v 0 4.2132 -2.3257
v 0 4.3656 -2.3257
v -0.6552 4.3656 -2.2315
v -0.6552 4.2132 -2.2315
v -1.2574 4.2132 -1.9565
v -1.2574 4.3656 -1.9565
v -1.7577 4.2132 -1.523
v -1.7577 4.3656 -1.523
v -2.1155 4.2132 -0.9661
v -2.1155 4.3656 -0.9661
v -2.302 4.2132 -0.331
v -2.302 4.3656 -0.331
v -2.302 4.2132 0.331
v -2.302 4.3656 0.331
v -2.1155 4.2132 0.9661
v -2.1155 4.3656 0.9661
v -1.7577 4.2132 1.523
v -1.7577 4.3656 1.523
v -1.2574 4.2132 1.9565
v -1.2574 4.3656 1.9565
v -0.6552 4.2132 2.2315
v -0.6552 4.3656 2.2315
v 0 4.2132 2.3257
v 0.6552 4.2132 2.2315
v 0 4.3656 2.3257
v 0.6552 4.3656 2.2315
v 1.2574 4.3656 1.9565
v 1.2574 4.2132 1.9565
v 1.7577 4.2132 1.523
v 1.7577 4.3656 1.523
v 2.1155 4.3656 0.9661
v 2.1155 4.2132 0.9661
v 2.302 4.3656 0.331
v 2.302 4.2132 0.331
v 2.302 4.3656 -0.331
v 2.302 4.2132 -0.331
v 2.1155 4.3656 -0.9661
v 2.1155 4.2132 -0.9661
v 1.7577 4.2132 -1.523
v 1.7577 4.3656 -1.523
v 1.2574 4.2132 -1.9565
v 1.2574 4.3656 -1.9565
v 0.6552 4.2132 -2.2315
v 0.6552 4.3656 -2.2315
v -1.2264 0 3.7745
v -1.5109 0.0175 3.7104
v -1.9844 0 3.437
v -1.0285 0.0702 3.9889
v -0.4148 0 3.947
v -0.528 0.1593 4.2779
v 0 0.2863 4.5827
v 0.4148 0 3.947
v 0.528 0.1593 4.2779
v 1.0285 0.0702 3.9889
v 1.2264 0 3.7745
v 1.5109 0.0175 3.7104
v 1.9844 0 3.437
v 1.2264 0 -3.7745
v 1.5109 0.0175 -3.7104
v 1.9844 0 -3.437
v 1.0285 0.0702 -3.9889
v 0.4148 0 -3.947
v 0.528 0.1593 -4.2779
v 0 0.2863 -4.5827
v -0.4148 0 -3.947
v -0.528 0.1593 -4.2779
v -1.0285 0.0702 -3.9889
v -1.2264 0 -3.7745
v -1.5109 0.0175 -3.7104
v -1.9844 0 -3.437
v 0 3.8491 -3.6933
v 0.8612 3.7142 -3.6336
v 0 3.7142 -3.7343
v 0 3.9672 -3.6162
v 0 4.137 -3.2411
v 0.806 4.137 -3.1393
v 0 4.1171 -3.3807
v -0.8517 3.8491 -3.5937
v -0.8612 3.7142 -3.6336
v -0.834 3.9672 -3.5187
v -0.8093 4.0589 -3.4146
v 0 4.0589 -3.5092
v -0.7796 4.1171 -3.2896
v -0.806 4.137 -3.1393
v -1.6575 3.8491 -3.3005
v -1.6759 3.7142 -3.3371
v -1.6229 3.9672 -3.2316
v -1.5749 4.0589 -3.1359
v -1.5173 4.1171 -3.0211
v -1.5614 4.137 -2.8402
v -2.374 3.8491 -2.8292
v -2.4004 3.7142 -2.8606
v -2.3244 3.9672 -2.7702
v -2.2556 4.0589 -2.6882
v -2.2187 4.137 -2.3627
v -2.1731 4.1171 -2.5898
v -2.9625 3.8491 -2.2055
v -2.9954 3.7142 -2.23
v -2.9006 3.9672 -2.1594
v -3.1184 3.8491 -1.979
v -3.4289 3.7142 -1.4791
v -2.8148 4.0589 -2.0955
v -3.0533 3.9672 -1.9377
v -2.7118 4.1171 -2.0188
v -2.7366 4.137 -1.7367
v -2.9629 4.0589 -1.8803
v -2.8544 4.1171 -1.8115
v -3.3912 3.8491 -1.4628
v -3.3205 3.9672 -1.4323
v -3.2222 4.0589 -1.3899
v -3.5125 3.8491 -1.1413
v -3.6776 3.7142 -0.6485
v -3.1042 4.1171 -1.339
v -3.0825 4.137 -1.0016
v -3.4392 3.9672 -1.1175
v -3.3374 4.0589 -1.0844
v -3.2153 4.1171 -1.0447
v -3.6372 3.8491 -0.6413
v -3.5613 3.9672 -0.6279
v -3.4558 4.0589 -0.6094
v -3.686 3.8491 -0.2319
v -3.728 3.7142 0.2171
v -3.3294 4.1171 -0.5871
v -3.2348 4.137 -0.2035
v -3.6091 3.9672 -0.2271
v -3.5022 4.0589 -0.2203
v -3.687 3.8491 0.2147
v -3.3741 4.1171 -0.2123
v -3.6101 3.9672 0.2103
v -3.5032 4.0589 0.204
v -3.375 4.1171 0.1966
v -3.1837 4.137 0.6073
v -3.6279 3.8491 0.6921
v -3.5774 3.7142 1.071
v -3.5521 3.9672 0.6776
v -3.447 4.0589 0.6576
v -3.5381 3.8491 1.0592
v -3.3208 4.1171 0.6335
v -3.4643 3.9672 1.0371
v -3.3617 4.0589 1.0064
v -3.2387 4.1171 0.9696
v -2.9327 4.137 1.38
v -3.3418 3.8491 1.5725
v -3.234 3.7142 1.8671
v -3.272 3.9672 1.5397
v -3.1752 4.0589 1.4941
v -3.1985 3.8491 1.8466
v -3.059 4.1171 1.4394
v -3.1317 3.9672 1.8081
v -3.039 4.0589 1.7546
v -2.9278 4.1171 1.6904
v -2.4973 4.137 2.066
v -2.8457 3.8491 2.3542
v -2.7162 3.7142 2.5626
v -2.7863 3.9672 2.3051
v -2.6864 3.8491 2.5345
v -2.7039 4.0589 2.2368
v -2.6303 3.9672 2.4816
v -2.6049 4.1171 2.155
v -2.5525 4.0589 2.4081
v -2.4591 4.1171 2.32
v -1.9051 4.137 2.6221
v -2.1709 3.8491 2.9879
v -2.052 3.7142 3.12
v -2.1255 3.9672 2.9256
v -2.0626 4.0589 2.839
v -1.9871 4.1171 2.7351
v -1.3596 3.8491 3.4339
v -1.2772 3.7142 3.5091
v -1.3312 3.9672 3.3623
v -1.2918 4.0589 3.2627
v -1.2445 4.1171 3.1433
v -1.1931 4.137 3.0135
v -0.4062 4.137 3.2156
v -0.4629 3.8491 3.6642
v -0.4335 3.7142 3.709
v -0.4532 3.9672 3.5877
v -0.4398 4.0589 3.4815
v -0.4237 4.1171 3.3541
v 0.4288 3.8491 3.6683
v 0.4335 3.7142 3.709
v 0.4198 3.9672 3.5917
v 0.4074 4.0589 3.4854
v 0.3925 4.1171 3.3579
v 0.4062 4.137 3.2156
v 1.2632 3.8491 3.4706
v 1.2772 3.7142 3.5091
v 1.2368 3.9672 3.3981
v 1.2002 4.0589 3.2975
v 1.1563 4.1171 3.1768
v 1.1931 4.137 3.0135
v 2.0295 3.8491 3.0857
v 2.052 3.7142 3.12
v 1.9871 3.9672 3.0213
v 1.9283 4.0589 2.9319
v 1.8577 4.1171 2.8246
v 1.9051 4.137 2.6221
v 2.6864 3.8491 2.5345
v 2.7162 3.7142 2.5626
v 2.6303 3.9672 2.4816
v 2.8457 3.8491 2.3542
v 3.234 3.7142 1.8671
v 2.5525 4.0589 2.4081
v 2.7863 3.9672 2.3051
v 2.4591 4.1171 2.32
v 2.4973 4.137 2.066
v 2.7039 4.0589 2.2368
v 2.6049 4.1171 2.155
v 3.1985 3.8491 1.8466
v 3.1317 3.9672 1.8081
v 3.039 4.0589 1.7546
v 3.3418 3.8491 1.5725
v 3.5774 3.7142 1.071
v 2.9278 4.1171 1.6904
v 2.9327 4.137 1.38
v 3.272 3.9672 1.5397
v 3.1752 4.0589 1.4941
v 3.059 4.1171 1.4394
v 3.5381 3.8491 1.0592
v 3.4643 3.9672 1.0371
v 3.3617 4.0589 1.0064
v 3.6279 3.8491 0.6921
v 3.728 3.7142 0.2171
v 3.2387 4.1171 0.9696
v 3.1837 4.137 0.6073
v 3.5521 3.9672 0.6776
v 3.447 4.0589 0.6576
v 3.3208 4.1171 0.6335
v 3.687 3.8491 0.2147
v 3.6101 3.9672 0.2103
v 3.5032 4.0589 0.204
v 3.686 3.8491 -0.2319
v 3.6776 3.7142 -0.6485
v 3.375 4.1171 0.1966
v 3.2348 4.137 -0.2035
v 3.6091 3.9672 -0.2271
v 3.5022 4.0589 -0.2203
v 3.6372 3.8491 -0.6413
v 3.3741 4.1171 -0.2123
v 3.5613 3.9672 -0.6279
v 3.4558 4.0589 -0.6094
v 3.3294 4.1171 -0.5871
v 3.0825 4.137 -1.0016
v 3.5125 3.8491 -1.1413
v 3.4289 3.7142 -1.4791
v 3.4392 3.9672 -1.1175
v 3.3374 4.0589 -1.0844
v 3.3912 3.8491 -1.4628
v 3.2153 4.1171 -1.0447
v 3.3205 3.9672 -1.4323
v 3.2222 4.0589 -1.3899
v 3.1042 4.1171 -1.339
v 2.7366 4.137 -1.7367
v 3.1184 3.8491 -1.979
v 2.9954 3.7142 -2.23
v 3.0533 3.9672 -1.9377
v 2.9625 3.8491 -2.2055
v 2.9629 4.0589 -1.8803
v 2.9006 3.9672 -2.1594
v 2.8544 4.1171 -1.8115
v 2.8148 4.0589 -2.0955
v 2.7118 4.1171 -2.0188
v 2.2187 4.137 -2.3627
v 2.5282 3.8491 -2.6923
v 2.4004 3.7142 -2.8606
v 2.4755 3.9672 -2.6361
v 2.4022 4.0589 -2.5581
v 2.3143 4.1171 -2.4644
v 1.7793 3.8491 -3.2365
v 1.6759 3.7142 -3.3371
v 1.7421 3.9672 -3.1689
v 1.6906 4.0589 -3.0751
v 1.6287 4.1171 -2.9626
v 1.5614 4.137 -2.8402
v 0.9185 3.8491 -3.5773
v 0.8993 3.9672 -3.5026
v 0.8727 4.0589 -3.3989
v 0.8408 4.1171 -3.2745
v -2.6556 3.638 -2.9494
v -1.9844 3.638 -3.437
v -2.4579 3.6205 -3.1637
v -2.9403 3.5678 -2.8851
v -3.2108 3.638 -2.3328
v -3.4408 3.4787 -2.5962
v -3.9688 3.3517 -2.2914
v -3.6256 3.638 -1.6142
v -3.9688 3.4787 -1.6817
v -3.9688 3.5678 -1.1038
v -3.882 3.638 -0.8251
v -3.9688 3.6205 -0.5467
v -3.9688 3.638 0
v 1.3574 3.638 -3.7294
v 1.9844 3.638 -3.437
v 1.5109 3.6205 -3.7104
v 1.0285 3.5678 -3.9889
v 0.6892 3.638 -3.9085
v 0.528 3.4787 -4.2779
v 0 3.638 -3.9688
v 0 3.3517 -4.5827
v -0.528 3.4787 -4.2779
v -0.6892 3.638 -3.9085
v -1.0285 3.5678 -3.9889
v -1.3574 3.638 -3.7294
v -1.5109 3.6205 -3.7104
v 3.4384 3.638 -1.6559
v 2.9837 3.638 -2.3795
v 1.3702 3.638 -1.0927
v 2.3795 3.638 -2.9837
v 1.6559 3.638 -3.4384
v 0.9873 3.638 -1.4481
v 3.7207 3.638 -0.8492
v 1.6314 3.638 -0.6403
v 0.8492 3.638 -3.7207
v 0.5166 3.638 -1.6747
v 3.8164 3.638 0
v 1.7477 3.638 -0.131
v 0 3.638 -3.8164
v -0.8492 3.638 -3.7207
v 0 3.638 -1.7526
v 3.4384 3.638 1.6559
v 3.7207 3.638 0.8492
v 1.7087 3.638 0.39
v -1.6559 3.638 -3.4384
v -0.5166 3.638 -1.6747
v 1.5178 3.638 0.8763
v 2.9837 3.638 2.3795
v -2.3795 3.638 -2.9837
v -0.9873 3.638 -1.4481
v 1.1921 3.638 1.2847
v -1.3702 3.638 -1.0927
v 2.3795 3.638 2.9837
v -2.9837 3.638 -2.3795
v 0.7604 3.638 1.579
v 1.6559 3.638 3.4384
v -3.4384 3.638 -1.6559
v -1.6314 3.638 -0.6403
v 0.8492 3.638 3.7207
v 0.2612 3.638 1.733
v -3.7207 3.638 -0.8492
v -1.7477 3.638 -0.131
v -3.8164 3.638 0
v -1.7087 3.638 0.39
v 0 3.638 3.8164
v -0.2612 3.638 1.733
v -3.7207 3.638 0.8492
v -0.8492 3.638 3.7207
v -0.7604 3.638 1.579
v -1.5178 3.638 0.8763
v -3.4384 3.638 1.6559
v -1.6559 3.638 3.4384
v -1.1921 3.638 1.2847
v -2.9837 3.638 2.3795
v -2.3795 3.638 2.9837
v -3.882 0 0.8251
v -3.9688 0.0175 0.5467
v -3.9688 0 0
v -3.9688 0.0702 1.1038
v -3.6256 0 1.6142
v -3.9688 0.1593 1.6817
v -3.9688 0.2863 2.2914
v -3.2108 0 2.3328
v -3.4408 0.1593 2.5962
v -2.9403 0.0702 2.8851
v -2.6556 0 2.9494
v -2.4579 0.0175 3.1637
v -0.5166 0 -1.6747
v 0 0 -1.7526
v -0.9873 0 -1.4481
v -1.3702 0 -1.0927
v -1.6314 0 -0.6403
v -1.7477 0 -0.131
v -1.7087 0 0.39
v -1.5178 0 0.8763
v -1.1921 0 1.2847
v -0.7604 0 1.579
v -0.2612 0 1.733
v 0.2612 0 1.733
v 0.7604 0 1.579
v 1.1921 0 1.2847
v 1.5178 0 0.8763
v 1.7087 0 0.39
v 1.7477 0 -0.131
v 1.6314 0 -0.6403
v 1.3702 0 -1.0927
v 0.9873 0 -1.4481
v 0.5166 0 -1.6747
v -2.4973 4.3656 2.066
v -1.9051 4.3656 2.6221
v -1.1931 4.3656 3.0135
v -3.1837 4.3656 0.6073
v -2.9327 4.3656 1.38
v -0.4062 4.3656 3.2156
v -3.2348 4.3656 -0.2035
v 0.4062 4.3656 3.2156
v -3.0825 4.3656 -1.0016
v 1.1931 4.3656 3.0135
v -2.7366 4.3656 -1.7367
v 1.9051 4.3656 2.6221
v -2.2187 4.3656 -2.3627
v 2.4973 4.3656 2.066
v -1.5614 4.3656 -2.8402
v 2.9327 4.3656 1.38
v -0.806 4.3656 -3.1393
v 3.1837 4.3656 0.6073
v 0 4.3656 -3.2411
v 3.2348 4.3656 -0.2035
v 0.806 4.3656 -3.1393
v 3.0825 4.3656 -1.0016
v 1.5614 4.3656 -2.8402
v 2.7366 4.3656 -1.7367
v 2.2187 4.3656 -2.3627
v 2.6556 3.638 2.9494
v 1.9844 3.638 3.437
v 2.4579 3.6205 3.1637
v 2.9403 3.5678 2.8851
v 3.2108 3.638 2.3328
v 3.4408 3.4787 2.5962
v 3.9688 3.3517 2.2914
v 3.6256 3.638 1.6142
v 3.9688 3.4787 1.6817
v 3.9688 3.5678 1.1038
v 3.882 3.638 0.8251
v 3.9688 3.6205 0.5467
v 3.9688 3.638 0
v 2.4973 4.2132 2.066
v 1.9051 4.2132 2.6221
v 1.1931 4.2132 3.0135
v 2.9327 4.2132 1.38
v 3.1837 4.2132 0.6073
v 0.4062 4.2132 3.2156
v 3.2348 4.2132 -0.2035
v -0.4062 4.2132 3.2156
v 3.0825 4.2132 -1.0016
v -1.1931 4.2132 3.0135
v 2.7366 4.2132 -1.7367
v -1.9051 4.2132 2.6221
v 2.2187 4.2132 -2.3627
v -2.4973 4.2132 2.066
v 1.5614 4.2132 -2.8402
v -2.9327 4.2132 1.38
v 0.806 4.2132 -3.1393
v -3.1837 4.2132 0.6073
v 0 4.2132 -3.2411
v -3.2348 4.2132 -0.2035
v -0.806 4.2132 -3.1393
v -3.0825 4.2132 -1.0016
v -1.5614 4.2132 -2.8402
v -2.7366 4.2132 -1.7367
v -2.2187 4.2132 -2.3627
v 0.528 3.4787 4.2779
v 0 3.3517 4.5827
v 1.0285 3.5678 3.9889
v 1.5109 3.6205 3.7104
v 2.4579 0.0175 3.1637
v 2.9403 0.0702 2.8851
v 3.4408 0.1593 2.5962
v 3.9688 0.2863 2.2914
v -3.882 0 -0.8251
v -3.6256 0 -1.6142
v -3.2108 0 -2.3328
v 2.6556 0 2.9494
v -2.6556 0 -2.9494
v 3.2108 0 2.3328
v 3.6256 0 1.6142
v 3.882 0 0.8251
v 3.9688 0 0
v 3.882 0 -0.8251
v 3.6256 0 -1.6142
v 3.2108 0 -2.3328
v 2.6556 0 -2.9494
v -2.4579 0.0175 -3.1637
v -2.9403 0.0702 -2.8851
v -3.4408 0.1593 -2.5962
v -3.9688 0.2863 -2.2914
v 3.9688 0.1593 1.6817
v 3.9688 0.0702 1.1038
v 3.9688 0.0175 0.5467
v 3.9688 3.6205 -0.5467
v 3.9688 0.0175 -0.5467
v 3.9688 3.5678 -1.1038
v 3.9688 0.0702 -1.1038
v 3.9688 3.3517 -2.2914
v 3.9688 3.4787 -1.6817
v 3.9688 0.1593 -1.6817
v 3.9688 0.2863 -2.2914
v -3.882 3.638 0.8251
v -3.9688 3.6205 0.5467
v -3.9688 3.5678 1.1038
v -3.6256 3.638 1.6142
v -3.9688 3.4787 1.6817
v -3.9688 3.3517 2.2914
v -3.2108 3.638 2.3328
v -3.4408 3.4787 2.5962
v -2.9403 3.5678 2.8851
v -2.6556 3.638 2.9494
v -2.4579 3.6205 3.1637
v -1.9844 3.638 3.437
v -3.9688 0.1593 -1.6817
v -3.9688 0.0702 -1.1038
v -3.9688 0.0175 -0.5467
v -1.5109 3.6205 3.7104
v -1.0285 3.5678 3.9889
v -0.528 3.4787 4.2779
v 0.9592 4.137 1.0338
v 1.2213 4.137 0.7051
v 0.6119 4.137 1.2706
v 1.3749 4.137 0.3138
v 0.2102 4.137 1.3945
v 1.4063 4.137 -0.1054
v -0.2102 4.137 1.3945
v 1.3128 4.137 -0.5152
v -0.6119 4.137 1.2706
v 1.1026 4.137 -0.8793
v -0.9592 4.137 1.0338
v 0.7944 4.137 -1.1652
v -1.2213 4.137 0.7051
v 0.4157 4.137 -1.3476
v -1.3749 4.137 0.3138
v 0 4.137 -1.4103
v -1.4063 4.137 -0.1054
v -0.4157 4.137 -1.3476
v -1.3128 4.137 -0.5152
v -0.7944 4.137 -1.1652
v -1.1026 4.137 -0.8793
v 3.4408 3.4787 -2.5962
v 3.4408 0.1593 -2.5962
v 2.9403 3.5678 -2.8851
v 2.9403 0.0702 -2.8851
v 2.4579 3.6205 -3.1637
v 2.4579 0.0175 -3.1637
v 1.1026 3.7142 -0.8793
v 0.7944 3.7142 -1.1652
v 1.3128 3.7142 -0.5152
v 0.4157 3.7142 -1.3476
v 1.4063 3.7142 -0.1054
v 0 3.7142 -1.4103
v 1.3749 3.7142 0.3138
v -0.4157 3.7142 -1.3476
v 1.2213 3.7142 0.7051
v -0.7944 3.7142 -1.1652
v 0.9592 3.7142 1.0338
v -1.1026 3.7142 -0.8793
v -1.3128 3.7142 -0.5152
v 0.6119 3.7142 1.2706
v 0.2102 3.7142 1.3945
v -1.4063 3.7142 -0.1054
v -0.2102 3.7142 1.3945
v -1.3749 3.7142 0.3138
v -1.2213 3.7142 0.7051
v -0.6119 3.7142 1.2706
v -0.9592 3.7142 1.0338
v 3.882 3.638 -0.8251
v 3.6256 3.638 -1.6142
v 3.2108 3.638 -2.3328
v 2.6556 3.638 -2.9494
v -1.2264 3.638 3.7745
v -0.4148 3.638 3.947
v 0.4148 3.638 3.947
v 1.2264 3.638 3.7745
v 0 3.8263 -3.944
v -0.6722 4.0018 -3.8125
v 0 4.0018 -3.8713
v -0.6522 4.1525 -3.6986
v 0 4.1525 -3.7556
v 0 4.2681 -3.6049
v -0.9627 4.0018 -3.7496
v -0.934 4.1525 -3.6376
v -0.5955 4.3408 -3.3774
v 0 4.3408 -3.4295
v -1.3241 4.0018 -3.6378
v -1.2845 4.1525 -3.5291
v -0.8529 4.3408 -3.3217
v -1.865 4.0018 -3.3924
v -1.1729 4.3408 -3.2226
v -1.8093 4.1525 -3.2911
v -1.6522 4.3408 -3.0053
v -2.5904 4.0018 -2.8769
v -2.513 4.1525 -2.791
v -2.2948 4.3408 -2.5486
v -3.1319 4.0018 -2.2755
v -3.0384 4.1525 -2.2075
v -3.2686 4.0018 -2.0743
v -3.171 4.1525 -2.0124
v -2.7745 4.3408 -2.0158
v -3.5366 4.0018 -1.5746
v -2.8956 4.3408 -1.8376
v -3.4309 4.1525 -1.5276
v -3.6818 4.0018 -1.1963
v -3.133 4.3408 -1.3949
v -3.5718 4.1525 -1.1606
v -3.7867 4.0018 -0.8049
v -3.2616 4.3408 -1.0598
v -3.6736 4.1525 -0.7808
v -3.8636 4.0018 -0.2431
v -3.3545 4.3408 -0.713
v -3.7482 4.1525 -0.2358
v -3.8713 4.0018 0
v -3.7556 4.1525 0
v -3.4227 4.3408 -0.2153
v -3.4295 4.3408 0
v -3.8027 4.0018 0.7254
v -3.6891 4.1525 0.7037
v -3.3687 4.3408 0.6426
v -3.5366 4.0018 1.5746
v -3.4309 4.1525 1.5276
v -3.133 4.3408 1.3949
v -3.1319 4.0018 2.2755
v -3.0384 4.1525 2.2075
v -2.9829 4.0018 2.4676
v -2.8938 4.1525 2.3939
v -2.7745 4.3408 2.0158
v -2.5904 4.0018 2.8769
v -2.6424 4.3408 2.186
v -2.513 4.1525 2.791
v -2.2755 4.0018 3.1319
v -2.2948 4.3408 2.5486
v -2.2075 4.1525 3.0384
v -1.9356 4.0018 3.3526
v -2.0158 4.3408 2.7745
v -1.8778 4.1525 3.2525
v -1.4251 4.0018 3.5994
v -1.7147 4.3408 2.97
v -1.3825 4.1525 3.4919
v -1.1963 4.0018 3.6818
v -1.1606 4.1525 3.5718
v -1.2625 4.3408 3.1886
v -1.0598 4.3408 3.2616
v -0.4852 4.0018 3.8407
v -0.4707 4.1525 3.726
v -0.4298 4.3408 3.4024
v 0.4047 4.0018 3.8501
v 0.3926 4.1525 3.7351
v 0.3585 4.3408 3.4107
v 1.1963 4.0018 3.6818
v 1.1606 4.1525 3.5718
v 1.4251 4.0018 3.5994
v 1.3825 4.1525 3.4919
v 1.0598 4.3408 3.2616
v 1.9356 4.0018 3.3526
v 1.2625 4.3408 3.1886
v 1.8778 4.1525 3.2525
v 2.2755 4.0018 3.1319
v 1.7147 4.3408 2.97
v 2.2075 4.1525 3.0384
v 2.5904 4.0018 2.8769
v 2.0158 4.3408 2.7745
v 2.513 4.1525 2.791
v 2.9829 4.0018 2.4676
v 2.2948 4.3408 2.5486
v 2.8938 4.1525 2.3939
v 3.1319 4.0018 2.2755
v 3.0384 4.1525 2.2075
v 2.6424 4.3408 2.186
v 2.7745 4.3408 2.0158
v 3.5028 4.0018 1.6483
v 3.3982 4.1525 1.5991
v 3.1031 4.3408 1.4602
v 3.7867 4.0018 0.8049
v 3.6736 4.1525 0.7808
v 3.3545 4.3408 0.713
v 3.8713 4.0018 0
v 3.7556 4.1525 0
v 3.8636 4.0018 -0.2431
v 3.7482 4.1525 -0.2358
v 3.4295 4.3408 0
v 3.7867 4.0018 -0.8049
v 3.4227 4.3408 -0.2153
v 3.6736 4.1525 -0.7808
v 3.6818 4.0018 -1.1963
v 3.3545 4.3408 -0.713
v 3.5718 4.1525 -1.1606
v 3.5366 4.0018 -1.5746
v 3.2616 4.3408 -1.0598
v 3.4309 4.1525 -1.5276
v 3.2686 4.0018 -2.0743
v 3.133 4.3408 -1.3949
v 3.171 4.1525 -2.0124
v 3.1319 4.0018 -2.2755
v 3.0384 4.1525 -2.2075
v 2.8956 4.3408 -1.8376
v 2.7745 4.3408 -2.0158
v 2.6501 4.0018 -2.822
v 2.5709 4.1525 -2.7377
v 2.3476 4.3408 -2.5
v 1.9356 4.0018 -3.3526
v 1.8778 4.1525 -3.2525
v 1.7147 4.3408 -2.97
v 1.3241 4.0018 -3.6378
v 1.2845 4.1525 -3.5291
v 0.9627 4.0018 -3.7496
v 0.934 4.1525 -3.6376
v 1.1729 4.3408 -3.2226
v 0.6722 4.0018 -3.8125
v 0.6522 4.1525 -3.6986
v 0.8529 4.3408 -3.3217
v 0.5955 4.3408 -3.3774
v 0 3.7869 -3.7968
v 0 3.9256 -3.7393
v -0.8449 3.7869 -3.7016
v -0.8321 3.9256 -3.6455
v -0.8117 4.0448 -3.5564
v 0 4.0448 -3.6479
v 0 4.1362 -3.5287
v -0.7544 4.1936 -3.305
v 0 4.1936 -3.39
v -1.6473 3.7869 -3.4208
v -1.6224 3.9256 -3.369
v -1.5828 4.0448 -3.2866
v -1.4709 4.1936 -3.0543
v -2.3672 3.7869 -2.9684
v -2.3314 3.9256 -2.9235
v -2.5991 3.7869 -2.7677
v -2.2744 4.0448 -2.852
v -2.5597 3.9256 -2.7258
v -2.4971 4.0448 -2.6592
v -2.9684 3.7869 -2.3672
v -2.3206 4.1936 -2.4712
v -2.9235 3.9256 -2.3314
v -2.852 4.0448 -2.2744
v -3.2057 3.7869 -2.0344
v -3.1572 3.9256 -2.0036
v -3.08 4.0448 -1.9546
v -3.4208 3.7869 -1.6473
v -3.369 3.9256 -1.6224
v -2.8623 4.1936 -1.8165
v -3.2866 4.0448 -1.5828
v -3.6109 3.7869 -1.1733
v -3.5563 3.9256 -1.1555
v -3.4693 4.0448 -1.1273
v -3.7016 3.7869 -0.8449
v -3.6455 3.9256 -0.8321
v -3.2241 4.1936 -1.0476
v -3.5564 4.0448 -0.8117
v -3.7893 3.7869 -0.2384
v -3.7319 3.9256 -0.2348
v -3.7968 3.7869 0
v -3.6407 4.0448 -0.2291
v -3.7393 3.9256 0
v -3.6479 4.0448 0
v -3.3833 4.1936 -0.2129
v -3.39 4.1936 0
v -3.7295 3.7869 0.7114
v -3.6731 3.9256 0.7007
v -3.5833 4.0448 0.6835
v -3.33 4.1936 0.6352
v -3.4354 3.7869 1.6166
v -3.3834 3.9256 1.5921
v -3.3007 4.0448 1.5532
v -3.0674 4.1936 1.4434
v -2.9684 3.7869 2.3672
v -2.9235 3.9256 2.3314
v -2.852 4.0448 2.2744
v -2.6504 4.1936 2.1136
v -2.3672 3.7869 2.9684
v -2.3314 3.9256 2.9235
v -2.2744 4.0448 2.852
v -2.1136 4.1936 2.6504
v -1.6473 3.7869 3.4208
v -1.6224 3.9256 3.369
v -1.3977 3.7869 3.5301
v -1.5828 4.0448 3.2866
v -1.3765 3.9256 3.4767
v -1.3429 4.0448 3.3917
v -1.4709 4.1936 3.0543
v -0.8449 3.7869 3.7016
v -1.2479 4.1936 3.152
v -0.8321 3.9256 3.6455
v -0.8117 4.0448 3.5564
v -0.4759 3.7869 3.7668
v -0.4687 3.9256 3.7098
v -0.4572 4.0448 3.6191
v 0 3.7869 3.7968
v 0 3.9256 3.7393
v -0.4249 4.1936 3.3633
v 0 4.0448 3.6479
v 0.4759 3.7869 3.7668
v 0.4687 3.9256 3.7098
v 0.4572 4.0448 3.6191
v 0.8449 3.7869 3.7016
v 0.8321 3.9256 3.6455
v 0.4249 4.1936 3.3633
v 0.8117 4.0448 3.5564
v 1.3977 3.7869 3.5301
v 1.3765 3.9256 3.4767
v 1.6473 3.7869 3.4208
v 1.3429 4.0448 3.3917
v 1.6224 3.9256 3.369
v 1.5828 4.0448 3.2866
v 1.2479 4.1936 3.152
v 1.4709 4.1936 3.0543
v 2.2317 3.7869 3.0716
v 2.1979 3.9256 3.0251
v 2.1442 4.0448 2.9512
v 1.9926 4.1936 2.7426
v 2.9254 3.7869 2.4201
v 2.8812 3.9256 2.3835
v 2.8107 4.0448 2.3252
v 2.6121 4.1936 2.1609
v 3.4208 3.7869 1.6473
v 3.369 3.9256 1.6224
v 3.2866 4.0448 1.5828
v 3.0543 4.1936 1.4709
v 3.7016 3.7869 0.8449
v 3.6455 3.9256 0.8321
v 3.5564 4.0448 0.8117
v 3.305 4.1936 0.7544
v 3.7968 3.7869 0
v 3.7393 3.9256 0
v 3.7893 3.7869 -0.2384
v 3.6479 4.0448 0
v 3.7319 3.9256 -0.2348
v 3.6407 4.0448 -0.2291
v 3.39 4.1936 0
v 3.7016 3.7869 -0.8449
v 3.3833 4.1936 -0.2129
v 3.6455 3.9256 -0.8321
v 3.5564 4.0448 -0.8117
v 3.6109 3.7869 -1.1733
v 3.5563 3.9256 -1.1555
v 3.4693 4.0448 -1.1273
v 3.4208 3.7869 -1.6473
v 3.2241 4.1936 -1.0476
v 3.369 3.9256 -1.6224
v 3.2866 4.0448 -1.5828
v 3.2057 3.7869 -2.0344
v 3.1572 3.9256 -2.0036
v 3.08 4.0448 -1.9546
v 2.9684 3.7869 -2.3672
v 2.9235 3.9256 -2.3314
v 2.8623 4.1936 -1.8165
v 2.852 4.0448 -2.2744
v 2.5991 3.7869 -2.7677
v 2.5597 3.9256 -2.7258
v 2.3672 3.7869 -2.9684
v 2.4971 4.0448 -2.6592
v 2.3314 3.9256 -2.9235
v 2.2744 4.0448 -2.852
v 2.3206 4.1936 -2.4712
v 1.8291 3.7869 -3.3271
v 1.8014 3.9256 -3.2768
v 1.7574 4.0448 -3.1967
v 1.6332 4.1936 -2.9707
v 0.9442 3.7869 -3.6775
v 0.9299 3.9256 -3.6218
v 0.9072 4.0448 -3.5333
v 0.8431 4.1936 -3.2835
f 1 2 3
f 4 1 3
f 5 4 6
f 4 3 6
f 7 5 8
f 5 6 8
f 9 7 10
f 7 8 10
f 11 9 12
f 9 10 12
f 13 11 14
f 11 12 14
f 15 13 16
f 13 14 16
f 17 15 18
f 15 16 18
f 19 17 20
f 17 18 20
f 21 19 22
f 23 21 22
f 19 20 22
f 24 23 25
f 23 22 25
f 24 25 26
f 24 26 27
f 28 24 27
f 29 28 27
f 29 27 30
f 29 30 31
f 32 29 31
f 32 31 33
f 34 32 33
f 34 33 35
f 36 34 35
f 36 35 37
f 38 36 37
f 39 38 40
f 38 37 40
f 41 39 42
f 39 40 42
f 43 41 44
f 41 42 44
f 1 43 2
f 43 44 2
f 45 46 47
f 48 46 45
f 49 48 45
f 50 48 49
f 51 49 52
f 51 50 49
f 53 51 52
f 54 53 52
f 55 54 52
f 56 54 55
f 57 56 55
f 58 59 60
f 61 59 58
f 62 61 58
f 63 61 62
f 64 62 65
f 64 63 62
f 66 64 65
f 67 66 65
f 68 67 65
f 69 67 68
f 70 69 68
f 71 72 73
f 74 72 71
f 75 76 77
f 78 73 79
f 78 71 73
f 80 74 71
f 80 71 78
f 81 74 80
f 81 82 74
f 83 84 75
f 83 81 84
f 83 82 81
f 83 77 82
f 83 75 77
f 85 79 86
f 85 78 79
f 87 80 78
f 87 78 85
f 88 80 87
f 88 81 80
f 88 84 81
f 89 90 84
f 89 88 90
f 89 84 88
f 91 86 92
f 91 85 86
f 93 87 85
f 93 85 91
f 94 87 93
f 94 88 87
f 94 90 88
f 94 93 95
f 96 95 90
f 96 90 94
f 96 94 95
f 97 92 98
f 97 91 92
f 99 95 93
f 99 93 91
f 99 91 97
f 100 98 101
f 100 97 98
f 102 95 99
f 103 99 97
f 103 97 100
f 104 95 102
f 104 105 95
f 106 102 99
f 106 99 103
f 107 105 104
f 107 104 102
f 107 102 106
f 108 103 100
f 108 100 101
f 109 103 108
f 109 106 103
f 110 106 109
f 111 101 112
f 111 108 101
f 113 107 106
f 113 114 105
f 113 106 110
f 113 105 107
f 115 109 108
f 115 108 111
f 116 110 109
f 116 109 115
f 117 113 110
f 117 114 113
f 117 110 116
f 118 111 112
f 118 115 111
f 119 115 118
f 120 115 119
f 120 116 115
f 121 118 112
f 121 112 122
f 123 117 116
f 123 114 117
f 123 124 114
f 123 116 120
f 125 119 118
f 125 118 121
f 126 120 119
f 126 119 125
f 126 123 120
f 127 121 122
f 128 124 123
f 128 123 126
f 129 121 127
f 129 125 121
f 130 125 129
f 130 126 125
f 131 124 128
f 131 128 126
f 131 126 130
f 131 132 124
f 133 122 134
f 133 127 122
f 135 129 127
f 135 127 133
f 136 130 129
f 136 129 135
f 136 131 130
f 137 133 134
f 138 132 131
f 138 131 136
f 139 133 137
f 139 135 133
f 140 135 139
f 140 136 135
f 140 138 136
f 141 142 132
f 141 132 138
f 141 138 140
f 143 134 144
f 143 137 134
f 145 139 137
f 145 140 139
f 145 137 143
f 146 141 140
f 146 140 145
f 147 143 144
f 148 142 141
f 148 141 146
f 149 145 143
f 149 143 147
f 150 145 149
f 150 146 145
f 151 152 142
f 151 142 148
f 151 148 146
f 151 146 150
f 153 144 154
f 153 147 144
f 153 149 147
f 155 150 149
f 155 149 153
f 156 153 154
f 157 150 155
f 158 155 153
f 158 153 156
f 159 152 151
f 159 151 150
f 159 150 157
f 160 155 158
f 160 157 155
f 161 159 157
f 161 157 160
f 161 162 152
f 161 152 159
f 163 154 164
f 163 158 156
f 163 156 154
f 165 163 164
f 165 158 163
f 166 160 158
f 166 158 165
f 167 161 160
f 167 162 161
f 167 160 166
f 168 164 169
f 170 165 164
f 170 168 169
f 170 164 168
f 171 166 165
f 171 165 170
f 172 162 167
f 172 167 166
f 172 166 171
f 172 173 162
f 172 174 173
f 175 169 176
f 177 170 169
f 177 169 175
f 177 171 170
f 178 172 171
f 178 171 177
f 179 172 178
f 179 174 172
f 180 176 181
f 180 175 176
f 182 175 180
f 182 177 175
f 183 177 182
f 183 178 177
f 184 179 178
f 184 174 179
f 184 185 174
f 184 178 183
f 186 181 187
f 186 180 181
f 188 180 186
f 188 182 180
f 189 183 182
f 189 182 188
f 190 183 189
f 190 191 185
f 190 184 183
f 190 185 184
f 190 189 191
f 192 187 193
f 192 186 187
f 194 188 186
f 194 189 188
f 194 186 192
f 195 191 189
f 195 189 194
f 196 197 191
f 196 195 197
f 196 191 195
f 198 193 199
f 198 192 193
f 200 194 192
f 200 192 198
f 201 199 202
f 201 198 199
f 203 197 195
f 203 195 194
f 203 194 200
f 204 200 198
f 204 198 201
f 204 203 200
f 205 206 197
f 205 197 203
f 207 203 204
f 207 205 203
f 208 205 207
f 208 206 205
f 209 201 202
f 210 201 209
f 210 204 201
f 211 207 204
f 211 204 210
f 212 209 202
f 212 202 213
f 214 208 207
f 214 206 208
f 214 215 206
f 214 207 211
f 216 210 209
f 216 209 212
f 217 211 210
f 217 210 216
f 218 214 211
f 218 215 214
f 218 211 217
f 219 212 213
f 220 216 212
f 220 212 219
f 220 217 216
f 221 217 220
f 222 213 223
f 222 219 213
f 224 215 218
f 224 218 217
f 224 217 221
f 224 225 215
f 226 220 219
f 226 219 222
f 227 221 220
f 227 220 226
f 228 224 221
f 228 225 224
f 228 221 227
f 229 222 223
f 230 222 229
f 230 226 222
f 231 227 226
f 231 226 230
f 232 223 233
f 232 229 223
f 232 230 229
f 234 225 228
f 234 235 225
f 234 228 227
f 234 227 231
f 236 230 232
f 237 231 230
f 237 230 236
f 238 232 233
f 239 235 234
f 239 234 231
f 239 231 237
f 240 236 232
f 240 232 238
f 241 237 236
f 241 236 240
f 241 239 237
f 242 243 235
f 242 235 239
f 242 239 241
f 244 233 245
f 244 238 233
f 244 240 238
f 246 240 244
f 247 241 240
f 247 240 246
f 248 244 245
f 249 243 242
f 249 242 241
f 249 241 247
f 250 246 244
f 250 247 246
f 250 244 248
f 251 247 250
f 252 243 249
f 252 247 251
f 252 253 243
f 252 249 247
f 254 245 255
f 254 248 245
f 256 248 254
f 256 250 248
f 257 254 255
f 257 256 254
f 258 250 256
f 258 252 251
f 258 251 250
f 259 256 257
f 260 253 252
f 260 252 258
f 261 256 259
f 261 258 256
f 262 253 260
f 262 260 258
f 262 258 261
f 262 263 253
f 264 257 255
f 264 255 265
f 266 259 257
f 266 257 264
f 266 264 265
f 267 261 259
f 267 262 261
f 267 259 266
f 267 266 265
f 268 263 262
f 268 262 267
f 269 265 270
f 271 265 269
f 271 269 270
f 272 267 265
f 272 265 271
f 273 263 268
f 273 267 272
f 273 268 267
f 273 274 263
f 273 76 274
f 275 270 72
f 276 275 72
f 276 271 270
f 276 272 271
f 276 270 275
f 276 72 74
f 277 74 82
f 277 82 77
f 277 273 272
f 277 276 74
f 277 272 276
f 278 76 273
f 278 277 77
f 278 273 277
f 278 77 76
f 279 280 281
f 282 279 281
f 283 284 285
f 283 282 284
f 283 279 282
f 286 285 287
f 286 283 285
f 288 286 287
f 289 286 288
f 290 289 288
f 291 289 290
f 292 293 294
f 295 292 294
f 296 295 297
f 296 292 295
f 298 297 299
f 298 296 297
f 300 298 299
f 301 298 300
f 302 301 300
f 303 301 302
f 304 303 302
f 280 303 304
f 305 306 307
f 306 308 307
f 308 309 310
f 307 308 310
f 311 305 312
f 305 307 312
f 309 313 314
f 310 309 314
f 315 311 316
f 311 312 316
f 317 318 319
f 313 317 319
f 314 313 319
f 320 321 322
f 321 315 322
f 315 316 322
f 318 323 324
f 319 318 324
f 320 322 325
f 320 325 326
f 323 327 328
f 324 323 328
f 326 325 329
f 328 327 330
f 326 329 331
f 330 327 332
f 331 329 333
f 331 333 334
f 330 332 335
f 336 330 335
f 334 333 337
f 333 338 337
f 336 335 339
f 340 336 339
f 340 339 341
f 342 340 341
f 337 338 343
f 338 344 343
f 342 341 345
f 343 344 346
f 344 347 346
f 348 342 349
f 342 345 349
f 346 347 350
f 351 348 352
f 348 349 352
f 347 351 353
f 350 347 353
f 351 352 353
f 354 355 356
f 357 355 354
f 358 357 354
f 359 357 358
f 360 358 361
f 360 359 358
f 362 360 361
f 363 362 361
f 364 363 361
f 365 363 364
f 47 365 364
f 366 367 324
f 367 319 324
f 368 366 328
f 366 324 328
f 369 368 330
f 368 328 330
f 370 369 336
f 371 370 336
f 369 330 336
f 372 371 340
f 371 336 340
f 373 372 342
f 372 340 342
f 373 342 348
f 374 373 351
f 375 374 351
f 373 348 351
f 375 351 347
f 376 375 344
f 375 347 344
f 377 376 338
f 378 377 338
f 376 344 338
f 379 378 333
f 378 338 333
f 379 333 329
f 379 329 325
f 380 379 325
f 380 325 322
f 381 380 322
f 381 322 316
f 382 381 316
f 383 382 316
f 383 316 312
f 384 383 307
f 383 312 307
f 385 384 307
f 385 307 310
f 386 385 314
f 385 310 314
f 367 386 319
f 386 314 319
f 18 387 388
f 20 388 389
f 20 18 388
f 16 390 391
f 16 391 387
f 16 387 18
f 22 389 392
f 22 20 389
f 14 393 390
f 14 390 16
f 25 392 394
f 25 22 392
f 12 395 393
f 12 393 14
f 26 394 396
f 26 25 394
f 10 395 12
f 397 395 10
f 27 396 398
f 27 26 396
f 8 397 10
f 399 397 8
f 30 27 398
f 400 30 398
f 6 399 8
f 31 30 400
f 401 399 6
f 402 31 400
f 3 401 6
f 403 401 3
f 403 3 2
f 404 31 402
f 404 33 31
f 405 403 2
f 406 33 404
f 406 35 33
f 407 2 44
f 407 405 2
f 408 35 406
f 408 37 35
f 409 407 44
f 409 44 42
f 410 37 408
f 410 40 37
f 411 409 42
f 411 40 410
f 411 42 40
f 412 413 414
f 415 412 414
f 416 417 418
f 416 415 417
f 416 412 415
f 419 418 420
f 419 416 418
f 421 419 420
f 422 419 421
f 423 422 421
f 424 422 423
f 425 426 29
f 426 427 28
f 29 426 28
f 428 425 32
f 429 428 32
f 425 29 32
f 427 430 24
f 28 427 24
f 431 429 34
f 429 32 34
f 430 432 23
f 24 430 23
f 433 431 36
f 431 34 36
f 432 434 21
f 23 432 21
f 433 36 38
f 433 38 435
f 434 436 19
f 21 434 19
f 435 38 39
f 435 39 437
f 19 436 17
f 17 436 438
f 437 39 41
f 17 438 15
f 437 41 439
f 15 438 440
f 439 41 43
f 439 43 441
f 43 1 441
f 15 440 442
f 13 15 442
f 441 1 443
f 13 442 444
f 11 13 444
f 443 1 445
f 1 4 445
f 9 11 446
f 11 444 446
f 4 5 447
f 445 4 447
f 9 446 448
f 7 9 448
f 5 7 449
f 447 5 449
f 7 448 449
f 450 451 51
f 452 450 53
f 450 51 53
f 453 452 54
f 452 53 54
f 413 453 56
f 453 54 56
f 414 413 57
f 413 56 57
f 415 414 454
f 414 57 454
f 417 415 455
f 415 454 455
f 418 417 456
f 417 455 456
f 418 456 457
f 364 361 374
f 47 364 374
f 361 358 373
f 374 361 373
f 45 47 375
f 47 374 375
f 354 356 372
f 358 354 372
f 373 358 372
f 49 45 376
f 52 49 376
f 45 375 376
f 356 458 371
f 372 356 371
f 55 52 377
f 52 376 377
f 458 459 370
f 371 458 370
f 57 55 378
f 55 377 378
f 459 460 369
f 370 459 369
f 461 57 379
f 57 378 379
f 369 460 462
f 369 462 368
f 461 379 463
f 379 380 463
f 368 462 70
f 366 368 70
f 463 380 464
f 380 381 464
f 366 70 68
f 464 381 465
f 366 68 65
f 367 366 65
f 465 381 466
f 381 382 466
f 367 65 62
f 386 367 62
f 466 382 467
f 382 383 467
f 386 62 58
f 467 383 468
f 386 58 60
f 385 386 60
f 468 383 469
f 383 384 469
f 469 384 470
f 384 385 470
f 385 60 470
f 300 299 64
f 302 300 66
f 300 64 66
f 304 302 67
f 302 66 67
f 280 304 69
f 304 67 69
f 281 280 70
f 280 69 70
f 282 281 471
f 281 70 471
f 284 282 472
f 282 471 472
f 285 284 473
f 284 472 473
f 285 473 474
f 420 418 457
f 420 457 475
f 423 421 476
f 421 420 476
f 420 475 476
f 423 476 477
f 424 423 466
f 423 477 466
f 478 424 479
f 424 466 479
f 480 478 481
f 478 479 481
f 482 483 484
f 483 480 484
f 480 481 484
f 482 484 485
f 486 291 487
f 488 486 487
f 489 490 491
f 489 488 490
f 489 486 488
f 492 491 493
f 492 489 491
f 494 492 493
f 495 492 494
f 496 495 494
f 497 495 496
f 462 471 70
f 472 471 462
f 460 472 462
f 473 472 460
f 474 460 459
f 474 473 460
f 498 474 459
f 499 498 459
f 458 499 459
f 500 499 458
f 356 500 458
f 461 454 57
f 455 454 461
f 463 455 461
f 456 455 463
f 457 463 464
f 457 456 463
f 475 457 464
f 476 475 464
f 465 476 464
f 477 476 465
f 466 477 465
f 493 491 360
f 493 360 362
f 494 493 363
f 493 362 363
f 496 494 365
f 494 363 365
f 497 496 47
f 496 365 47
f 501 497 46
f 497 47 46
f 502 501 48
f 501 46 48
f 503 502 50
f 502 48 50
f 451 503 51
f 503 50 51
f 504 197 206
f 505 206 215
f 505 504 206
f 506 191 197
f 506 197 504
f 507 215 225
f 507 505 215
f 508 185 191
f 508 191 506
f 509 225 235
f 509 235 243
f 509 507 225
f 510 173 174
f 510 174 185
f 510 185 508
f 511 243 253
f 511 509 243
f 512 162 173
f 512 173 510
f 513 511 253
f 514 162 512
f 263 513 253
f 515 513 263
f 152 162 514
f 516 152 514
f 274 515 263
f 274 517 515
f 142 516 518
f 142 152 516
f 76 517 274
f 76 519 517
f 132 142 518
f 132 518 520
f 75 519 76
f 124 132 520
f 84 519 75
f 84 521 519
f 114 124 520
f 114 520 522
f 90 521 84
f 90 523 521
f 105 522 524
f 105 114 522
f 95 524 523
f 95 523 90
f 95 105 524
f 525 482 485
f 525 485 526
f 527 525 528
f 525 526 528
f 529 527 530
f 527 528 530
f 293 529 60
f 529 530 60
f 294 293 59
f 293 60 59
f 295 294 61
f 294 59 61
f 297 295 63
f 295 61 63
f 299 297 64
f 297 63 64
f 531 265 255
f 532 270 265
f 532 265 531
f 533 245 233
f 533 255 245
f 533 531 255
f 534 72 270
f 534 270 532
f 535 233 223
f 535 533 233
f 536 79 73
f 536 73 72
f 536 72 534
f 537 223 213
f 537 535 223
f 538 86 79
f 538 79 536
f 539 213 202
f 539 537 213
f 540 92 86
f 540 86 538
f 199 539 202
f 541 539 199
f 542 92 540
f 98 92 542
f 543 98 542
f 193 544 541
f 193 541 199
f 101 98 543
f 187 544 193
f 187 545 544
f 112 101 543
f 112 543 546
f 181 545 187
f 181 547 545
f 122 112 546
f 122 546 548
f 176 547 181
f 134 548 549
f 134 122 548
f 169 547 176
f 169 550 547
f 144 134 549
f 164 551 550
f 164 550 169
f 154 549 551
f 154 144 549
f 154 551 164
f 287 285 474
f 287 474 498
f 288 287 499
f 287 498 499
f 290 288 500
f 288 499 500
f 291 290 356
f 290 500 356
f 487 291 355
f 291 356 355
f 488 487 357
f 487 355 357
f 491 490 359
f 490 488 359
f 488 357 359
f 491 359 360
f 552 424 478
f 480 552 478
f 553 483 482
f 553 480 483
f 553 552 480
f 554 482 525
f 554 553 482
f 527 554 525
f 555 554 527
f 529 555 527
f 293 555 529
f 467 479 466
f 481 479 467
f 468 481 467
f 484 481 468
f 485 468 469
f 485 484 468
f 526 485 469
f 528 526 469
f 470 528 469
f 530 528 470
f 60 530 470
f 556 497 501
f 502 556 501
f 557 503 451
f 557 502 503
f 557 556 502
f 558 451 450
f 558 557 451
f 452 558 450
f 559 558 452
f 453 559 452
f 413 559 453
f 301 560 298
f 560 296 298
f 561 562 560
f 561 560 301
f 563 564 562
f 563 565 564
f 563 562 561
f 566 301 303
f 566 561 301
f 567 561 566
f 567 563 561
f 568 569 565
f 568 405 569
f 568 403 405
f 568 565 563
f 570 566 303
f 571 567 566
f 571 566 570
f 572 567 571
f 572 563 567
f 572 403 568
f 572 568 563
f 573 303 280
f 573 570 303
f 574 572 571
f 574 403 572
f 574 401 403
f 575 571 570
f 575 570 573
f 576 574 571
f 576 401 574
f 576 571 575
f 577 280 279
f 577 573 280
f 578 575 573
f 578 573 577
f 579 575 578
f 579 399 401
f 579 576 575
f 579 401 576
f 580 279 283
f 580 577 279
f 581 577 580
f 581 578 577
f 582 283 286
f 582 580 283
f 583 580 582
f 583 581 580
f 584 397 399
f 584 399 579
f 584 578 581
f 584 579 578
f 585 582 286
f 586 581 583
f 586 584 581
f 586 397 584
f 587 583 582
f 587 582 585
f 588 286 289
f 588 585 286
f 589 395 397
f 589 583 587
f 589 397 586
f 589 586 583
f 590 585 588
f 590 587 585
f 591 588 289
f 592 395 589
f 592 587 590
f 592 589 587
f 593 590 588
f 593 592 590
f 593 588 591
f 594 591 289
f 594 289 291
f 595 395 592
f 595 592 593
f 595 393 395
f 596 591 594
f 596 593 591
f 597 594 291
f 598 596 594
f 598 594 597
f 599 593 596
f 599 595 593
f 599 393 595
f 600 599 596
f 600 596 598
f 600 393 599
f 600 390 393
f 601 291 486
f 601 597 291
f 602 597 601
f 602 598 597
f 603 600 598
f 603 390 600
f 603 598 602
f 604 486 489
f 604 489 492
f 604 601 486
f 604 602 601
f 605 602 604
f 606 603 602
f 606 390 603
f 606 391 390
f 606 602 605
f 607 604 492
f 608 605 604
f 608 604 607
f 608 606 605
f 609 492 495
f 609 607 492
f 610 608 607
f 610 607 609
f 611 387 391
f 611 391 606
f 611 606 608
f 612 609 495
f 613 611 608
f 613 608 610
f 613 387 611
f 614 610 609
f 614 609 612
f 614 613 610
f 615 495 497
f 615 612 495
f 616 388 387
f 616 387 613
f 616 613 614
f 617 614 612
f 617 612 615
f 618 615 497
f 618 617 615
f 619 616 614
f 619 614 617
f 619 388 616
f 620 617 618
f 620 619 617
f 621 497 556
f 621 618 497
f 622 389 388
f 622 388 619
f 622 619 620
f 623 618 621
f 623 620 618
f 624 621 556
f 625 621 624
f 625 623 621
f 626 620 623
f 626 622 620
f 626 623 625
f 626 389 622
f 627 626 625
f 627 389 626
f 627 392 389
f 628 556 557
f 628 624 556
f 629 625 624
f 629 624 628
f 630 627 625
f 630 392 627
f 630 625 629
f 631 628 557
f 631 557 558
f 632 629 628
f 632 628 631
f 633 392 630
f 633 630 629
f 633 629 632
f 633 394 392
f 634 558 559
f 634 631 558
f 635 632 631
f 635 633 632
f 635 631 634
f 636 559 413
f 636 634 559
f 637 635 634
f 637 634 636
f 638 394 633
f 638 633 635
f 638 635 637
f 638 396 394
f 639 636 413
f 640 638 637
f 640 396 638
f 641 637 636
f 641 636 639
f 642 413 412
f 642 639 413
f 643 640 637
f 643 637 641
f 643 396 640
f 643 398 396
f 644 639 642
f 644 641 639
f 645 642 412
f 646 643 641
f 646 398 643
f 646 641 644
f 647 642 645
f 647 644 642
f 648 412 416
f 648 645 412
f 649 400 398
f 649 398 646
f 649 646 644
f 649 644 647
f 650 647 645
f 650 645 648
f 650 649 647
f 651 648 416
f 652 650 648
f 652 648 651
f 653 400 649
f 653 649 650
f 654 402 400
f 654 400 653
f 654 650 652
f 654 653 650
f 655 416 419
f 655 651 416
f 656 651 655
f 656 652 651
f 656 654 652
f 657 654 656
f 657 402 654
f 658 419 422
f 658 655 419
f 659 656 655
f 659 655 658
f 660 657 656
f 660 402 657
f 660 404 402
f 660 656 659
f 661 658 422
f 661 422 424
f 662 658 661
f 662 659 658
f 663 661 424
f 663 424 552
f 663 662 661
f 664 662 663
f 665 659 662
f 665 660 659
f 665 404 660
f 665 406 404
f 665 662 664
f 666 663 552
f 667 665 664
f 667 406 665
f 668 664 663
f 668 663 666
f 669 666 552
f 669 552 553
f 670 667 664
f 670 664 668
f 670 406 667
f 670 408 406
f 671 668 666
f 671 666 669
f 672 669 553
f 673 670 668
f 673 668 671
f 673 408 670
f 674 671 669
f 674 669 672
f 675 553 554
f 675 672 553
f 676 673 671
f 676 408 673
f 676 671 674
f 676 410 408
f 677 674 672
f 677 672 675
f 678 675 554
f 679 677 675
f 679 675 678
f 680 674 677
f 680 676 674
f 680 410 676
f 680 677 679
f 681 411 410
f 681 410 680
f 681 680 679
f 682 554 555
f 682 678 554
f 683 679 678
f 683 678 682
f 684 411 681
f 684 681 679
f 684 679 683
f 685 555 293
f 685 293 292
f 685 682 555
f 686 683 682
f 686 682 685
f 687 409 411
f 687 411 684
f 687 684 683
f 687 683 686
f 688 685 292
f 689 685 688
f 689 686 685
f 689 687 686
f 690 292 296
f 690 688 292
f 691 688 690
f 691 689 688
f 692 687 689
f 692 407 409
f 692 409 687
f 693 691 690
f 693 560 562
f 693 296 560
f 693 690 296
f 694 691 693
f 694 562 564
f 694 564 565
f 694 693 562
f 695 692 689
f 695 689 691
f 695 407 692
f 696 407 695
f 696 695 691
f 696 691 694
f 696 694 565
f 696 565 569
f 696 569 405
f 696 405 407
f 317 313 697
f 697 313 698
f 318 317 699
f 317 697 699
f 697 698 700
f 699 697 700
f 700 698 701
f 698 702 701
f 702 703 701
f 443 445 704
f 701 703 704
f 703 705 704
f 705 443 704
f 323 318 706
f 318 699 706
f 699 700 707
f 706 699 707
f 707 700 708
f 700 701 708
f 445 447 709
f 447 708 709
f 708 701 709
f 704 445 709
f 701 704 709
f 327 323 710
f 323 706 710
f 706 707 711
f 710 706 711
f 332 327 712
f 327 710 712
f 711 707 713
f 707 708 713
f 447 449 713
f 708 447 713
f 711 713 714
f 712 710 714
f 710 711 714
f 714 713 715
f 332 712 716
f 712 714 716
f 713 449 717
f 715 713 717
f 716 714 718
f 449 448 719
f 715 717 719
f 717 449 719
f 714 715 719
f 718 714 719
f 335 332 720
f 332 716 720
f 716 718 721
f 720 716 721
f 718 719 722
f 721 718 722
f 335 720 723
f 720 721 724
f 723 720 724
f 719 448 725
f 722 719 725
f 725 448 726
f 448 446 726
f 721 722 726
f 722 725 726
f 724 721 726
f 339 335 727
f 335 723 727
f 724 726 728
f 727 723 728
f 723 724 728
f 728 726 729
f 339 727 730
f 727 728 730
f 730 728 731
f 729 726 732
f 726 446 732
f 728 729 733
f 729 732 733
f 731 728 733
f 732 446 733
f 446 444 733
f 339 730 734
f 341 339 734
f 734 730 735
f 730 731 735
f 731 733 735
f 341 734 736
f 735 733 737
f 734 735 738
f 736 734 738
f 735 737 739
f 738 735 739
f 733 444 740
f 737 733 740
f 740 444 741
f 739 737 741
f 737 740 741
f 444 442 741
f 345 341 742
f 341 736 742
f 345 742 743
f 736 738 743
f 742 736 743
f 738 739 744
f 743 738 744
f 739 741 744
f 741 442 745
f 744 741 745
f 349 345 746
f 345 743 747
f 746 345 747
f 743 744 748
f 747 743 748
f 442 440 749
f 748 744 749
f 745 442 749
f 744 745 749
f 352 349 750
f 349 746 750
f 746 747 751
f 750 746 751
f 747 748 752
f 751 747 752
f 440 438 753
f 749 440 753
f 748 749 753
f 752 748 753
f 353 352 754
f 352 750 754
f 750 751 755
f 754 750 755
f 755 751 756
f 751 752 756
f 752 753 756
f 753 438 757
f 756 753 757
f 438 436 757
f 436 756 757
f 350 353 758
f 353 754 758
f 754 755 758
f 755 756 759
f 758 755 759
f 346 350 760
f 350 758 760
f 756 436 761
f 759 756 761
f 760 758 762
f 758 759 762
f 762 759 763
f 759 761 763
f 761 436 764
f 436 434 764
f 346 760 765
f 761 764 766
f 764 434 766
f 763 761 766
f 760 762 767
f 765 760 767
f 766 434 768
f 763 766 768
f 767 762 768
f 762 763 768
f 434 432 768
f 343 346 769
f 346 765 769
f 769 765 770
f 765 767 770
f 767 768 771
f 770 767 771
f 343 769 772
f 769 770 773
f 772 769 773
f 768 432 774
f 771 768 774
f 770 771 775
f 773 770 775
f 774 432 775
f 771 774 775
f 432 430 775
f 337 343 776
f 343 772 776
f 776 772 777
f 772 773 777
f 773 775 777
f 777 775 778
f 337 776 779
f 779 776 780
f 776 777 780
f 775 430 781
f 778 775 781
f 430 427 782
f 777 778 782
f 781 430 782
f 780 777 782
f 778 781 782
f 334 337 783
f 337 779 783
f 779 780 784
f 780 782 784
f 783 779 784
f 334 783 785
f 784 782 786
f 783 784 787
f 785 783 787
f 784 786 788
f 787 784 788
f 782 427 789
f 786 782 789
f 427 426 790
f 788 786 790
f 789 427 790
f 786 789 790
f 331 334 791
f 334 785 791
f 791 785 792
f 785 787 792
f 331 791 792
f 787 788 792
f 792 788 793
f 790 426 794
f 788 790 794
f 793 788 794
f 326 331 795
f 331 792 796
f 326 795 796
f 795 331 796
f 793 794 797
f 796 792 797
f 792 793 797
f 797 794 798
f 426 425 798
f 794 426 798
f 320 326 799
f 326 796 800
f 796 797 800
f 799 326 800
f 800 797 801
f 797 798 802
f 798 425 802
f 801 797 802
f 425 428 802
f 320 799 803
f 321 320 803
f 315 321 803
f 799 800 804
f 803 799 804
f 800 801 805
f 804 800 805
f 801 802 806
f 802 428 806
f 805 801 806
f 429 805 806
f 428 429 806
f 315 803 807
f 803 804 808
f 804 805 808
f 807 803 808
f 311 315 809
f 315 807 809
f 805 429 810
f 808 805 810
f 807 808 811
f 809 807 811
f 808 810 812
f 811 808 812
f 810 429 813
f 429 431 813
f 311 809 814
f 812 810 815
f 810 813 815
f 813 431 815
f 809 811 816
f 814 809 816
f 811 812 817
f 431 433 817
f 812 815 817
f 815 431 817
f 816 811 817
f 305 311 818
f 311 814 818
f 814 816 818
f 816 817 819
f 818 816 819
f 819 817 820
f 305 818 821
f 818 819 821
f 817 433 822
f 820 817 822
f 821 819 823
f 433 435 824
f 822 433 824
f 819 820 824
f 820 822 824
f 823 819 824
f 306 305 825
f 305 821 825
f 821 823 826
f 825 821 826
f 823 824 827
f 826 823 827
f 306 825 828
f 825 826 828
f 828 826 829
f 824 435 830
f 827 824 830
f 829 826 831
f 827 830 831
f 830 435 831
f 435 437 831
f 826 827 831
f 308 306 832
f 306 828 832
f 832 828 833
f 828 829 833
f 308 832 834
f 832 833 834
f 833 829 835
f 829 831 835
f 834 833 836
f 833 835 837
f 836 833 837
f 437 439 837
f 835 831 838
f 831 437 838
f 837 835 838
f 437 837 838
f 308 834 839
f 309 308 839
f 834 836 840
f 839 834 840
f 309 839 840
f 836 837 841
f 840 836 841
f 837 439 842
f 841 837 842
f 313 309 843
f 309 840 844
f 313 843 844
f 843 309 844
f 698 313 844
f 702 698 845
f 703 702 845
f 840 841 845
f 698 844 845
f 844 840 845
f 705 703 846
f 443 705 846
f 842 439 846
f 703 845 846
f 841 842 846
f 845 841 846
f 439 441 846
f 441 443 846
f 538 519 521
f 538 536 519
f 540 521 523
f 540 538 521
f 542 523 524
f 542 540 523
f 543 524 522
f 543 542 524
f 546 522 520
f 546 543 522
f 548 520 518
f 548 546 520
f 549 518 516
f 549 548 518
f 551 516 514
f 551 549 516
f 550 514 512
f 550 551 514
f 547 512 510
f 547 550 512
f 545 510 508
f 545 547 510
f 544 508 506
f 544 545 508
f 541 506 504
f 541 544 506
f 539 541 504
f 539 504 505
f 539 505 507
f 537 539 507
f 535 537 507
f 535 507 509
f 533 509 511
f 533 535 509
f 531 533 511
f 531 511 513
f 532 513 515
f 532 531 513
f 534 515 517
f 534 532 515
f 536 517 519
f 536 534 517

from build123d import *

# Parameters (mm, degrees)
EXTRUDE1_DEPTH = 4.365625
SKETCH2_W      = 1.7526
SKETCH2_H      = 4.365625


with BuildPart() as part:
    # Sketch1 → Extrude1 (new body)
    with BuildSketch(Plane(origin=(0, 0, 0), x_dir=(1, 0, 0), z_dir=(0, 1, 0))):
        Polygon((0, 4.582717762), (-3.96875, 2.291358881), (-3.96875, -2.291358881), (0, -4.582717762), (3.96875, -2.291358881), (3.96875, 2.291358881), align=None)
    extrude(amount=EXTRUDE1_DEPTH)

    # Sketch4 → Cut-Revolve2 (revolve, cut)
    with BuildSketch(Plane(origin=(0, 0, 0), x_dir=(0, 0, -1), z_dir=(1, 0, 0))):
        Polygon((0, 4.365625), (1.7526, 4.365625), (1.410275607, 4.205996514), (1.410275607, 0.159628486), (1.7526, 0), (0, 0), align=None)
    revolve(axis=Axis((0, 4.365625, 0), (0, 1, 0)), mode=Mode.SUBTRACT)


with BuildPart() as body_2:
    # Sketch2 → Revolve1 (revolve)
    with BuildSketch(Plane(origin=(0, 0, 0), x_dir=(0, 0, -1), z_dir=(1, 0, 0))):
        with Locations((0.8763, 2.1828125)):
            Rectangle(SKETCH2_W, SKETCH2_H)
    revolve(axis=Axis((0, -1.7526, 0), (0, 1, 0)))


with BuildPart() as part_1:
    add(part.part)

    # Combine1: cut body 2
    add(body_2.part, mode=Mode.SUBTRACT)

    # Sketch5 → Cut-Revolve3 (revolve, cut)
    with BuildSketch(Plane(origin=(0, 0, 0), x_dir=(0, 0, -1), z_dir=(1, 0, 0))):
        with BuildLine():
            Line((0, 0), (3.96875, 0))
            Line((3.96875, 0), (4.582717762, 0.286297869))
            Line((4.582717762, 0.286297869), (4.582717762, 3.351722964))
            Line((4.582717762, 3.351722964), (3.96875, 3.638020833))
            ThreePointArc((3.96875, 3.638020833), (3.755639674, 4.152514674), (3.241145833, 4.365625))
            Line((3.241145833, 4.365625), (3.241145833, 5.635625))
            Line((3.241145833, 5.635625), (5.852717762, 5.635625))
            Line((5.852717762, 5.635625), (5.852717762, -1.27))
            Line((5.852717762, -1.27), (0, -1.27))
            Line((0, -1.27), (0, 0))
        make_face()
    revolve(axis=Axis((0, 0, 0), (0, 1, 0)), mode=Mode.SUBTRACT)

    # Sketch6 → Cut-Revolve4 (revolve, cut)
    with BuildSketch(Plane(origin=(0, 0, 0), x_dir=(0, 0, -1), z_dir=(1, 0, 0))):
        with BuildLine():
            Line((0, 3.638020833), (3.81635, 3.638020833))
            ThreePointArc((3.81635, 3.638020833), (3.6478766, 4.0447516), (3.241145833, 4.213225))
            Line((3.241145833, 4.213225), (2.32571072, 4.213225))
            Line((2.32571072, 4.213225), (2.32571072, 5.635625))
            Line((2.32571072, 5.635625), (0, 5.635625))
            Line((0, 5.635625), (0, 3.638020833))
        make_face()
    revolve(axis=Axis((0, 5.635625, 0), (0, 1, 0)), mode=Mode.SUBTRACT)


with BuildPart() as body_2_2:
    # Sketch7 → Revolve2 (revolve)
    with BuildSketch(Plane(origin=(0, 0, 0), x_dir=(0, 0, -1), z_dir=(1, 0, 0))):
        with BuildLine():
            Line((1.410275607, 3.714220833), (3.734297654, 3.714220833))
            ThreePointArc((3.734297654, 3.714220833), (3.565938876, 4.016854092), (3.241145833, 4.137025))
            Line((3.241145833, 4.137025), (1.410275607, 4.137025))
            Line((1.410275607, 4.137025), (1.410275607, 3.714220833))
        make_face()
    revolve(axis=Axis((0, 3.714220833, 0), (0, 1, 0)))


solid = Compound([part_1.part, body_2_2.part])
